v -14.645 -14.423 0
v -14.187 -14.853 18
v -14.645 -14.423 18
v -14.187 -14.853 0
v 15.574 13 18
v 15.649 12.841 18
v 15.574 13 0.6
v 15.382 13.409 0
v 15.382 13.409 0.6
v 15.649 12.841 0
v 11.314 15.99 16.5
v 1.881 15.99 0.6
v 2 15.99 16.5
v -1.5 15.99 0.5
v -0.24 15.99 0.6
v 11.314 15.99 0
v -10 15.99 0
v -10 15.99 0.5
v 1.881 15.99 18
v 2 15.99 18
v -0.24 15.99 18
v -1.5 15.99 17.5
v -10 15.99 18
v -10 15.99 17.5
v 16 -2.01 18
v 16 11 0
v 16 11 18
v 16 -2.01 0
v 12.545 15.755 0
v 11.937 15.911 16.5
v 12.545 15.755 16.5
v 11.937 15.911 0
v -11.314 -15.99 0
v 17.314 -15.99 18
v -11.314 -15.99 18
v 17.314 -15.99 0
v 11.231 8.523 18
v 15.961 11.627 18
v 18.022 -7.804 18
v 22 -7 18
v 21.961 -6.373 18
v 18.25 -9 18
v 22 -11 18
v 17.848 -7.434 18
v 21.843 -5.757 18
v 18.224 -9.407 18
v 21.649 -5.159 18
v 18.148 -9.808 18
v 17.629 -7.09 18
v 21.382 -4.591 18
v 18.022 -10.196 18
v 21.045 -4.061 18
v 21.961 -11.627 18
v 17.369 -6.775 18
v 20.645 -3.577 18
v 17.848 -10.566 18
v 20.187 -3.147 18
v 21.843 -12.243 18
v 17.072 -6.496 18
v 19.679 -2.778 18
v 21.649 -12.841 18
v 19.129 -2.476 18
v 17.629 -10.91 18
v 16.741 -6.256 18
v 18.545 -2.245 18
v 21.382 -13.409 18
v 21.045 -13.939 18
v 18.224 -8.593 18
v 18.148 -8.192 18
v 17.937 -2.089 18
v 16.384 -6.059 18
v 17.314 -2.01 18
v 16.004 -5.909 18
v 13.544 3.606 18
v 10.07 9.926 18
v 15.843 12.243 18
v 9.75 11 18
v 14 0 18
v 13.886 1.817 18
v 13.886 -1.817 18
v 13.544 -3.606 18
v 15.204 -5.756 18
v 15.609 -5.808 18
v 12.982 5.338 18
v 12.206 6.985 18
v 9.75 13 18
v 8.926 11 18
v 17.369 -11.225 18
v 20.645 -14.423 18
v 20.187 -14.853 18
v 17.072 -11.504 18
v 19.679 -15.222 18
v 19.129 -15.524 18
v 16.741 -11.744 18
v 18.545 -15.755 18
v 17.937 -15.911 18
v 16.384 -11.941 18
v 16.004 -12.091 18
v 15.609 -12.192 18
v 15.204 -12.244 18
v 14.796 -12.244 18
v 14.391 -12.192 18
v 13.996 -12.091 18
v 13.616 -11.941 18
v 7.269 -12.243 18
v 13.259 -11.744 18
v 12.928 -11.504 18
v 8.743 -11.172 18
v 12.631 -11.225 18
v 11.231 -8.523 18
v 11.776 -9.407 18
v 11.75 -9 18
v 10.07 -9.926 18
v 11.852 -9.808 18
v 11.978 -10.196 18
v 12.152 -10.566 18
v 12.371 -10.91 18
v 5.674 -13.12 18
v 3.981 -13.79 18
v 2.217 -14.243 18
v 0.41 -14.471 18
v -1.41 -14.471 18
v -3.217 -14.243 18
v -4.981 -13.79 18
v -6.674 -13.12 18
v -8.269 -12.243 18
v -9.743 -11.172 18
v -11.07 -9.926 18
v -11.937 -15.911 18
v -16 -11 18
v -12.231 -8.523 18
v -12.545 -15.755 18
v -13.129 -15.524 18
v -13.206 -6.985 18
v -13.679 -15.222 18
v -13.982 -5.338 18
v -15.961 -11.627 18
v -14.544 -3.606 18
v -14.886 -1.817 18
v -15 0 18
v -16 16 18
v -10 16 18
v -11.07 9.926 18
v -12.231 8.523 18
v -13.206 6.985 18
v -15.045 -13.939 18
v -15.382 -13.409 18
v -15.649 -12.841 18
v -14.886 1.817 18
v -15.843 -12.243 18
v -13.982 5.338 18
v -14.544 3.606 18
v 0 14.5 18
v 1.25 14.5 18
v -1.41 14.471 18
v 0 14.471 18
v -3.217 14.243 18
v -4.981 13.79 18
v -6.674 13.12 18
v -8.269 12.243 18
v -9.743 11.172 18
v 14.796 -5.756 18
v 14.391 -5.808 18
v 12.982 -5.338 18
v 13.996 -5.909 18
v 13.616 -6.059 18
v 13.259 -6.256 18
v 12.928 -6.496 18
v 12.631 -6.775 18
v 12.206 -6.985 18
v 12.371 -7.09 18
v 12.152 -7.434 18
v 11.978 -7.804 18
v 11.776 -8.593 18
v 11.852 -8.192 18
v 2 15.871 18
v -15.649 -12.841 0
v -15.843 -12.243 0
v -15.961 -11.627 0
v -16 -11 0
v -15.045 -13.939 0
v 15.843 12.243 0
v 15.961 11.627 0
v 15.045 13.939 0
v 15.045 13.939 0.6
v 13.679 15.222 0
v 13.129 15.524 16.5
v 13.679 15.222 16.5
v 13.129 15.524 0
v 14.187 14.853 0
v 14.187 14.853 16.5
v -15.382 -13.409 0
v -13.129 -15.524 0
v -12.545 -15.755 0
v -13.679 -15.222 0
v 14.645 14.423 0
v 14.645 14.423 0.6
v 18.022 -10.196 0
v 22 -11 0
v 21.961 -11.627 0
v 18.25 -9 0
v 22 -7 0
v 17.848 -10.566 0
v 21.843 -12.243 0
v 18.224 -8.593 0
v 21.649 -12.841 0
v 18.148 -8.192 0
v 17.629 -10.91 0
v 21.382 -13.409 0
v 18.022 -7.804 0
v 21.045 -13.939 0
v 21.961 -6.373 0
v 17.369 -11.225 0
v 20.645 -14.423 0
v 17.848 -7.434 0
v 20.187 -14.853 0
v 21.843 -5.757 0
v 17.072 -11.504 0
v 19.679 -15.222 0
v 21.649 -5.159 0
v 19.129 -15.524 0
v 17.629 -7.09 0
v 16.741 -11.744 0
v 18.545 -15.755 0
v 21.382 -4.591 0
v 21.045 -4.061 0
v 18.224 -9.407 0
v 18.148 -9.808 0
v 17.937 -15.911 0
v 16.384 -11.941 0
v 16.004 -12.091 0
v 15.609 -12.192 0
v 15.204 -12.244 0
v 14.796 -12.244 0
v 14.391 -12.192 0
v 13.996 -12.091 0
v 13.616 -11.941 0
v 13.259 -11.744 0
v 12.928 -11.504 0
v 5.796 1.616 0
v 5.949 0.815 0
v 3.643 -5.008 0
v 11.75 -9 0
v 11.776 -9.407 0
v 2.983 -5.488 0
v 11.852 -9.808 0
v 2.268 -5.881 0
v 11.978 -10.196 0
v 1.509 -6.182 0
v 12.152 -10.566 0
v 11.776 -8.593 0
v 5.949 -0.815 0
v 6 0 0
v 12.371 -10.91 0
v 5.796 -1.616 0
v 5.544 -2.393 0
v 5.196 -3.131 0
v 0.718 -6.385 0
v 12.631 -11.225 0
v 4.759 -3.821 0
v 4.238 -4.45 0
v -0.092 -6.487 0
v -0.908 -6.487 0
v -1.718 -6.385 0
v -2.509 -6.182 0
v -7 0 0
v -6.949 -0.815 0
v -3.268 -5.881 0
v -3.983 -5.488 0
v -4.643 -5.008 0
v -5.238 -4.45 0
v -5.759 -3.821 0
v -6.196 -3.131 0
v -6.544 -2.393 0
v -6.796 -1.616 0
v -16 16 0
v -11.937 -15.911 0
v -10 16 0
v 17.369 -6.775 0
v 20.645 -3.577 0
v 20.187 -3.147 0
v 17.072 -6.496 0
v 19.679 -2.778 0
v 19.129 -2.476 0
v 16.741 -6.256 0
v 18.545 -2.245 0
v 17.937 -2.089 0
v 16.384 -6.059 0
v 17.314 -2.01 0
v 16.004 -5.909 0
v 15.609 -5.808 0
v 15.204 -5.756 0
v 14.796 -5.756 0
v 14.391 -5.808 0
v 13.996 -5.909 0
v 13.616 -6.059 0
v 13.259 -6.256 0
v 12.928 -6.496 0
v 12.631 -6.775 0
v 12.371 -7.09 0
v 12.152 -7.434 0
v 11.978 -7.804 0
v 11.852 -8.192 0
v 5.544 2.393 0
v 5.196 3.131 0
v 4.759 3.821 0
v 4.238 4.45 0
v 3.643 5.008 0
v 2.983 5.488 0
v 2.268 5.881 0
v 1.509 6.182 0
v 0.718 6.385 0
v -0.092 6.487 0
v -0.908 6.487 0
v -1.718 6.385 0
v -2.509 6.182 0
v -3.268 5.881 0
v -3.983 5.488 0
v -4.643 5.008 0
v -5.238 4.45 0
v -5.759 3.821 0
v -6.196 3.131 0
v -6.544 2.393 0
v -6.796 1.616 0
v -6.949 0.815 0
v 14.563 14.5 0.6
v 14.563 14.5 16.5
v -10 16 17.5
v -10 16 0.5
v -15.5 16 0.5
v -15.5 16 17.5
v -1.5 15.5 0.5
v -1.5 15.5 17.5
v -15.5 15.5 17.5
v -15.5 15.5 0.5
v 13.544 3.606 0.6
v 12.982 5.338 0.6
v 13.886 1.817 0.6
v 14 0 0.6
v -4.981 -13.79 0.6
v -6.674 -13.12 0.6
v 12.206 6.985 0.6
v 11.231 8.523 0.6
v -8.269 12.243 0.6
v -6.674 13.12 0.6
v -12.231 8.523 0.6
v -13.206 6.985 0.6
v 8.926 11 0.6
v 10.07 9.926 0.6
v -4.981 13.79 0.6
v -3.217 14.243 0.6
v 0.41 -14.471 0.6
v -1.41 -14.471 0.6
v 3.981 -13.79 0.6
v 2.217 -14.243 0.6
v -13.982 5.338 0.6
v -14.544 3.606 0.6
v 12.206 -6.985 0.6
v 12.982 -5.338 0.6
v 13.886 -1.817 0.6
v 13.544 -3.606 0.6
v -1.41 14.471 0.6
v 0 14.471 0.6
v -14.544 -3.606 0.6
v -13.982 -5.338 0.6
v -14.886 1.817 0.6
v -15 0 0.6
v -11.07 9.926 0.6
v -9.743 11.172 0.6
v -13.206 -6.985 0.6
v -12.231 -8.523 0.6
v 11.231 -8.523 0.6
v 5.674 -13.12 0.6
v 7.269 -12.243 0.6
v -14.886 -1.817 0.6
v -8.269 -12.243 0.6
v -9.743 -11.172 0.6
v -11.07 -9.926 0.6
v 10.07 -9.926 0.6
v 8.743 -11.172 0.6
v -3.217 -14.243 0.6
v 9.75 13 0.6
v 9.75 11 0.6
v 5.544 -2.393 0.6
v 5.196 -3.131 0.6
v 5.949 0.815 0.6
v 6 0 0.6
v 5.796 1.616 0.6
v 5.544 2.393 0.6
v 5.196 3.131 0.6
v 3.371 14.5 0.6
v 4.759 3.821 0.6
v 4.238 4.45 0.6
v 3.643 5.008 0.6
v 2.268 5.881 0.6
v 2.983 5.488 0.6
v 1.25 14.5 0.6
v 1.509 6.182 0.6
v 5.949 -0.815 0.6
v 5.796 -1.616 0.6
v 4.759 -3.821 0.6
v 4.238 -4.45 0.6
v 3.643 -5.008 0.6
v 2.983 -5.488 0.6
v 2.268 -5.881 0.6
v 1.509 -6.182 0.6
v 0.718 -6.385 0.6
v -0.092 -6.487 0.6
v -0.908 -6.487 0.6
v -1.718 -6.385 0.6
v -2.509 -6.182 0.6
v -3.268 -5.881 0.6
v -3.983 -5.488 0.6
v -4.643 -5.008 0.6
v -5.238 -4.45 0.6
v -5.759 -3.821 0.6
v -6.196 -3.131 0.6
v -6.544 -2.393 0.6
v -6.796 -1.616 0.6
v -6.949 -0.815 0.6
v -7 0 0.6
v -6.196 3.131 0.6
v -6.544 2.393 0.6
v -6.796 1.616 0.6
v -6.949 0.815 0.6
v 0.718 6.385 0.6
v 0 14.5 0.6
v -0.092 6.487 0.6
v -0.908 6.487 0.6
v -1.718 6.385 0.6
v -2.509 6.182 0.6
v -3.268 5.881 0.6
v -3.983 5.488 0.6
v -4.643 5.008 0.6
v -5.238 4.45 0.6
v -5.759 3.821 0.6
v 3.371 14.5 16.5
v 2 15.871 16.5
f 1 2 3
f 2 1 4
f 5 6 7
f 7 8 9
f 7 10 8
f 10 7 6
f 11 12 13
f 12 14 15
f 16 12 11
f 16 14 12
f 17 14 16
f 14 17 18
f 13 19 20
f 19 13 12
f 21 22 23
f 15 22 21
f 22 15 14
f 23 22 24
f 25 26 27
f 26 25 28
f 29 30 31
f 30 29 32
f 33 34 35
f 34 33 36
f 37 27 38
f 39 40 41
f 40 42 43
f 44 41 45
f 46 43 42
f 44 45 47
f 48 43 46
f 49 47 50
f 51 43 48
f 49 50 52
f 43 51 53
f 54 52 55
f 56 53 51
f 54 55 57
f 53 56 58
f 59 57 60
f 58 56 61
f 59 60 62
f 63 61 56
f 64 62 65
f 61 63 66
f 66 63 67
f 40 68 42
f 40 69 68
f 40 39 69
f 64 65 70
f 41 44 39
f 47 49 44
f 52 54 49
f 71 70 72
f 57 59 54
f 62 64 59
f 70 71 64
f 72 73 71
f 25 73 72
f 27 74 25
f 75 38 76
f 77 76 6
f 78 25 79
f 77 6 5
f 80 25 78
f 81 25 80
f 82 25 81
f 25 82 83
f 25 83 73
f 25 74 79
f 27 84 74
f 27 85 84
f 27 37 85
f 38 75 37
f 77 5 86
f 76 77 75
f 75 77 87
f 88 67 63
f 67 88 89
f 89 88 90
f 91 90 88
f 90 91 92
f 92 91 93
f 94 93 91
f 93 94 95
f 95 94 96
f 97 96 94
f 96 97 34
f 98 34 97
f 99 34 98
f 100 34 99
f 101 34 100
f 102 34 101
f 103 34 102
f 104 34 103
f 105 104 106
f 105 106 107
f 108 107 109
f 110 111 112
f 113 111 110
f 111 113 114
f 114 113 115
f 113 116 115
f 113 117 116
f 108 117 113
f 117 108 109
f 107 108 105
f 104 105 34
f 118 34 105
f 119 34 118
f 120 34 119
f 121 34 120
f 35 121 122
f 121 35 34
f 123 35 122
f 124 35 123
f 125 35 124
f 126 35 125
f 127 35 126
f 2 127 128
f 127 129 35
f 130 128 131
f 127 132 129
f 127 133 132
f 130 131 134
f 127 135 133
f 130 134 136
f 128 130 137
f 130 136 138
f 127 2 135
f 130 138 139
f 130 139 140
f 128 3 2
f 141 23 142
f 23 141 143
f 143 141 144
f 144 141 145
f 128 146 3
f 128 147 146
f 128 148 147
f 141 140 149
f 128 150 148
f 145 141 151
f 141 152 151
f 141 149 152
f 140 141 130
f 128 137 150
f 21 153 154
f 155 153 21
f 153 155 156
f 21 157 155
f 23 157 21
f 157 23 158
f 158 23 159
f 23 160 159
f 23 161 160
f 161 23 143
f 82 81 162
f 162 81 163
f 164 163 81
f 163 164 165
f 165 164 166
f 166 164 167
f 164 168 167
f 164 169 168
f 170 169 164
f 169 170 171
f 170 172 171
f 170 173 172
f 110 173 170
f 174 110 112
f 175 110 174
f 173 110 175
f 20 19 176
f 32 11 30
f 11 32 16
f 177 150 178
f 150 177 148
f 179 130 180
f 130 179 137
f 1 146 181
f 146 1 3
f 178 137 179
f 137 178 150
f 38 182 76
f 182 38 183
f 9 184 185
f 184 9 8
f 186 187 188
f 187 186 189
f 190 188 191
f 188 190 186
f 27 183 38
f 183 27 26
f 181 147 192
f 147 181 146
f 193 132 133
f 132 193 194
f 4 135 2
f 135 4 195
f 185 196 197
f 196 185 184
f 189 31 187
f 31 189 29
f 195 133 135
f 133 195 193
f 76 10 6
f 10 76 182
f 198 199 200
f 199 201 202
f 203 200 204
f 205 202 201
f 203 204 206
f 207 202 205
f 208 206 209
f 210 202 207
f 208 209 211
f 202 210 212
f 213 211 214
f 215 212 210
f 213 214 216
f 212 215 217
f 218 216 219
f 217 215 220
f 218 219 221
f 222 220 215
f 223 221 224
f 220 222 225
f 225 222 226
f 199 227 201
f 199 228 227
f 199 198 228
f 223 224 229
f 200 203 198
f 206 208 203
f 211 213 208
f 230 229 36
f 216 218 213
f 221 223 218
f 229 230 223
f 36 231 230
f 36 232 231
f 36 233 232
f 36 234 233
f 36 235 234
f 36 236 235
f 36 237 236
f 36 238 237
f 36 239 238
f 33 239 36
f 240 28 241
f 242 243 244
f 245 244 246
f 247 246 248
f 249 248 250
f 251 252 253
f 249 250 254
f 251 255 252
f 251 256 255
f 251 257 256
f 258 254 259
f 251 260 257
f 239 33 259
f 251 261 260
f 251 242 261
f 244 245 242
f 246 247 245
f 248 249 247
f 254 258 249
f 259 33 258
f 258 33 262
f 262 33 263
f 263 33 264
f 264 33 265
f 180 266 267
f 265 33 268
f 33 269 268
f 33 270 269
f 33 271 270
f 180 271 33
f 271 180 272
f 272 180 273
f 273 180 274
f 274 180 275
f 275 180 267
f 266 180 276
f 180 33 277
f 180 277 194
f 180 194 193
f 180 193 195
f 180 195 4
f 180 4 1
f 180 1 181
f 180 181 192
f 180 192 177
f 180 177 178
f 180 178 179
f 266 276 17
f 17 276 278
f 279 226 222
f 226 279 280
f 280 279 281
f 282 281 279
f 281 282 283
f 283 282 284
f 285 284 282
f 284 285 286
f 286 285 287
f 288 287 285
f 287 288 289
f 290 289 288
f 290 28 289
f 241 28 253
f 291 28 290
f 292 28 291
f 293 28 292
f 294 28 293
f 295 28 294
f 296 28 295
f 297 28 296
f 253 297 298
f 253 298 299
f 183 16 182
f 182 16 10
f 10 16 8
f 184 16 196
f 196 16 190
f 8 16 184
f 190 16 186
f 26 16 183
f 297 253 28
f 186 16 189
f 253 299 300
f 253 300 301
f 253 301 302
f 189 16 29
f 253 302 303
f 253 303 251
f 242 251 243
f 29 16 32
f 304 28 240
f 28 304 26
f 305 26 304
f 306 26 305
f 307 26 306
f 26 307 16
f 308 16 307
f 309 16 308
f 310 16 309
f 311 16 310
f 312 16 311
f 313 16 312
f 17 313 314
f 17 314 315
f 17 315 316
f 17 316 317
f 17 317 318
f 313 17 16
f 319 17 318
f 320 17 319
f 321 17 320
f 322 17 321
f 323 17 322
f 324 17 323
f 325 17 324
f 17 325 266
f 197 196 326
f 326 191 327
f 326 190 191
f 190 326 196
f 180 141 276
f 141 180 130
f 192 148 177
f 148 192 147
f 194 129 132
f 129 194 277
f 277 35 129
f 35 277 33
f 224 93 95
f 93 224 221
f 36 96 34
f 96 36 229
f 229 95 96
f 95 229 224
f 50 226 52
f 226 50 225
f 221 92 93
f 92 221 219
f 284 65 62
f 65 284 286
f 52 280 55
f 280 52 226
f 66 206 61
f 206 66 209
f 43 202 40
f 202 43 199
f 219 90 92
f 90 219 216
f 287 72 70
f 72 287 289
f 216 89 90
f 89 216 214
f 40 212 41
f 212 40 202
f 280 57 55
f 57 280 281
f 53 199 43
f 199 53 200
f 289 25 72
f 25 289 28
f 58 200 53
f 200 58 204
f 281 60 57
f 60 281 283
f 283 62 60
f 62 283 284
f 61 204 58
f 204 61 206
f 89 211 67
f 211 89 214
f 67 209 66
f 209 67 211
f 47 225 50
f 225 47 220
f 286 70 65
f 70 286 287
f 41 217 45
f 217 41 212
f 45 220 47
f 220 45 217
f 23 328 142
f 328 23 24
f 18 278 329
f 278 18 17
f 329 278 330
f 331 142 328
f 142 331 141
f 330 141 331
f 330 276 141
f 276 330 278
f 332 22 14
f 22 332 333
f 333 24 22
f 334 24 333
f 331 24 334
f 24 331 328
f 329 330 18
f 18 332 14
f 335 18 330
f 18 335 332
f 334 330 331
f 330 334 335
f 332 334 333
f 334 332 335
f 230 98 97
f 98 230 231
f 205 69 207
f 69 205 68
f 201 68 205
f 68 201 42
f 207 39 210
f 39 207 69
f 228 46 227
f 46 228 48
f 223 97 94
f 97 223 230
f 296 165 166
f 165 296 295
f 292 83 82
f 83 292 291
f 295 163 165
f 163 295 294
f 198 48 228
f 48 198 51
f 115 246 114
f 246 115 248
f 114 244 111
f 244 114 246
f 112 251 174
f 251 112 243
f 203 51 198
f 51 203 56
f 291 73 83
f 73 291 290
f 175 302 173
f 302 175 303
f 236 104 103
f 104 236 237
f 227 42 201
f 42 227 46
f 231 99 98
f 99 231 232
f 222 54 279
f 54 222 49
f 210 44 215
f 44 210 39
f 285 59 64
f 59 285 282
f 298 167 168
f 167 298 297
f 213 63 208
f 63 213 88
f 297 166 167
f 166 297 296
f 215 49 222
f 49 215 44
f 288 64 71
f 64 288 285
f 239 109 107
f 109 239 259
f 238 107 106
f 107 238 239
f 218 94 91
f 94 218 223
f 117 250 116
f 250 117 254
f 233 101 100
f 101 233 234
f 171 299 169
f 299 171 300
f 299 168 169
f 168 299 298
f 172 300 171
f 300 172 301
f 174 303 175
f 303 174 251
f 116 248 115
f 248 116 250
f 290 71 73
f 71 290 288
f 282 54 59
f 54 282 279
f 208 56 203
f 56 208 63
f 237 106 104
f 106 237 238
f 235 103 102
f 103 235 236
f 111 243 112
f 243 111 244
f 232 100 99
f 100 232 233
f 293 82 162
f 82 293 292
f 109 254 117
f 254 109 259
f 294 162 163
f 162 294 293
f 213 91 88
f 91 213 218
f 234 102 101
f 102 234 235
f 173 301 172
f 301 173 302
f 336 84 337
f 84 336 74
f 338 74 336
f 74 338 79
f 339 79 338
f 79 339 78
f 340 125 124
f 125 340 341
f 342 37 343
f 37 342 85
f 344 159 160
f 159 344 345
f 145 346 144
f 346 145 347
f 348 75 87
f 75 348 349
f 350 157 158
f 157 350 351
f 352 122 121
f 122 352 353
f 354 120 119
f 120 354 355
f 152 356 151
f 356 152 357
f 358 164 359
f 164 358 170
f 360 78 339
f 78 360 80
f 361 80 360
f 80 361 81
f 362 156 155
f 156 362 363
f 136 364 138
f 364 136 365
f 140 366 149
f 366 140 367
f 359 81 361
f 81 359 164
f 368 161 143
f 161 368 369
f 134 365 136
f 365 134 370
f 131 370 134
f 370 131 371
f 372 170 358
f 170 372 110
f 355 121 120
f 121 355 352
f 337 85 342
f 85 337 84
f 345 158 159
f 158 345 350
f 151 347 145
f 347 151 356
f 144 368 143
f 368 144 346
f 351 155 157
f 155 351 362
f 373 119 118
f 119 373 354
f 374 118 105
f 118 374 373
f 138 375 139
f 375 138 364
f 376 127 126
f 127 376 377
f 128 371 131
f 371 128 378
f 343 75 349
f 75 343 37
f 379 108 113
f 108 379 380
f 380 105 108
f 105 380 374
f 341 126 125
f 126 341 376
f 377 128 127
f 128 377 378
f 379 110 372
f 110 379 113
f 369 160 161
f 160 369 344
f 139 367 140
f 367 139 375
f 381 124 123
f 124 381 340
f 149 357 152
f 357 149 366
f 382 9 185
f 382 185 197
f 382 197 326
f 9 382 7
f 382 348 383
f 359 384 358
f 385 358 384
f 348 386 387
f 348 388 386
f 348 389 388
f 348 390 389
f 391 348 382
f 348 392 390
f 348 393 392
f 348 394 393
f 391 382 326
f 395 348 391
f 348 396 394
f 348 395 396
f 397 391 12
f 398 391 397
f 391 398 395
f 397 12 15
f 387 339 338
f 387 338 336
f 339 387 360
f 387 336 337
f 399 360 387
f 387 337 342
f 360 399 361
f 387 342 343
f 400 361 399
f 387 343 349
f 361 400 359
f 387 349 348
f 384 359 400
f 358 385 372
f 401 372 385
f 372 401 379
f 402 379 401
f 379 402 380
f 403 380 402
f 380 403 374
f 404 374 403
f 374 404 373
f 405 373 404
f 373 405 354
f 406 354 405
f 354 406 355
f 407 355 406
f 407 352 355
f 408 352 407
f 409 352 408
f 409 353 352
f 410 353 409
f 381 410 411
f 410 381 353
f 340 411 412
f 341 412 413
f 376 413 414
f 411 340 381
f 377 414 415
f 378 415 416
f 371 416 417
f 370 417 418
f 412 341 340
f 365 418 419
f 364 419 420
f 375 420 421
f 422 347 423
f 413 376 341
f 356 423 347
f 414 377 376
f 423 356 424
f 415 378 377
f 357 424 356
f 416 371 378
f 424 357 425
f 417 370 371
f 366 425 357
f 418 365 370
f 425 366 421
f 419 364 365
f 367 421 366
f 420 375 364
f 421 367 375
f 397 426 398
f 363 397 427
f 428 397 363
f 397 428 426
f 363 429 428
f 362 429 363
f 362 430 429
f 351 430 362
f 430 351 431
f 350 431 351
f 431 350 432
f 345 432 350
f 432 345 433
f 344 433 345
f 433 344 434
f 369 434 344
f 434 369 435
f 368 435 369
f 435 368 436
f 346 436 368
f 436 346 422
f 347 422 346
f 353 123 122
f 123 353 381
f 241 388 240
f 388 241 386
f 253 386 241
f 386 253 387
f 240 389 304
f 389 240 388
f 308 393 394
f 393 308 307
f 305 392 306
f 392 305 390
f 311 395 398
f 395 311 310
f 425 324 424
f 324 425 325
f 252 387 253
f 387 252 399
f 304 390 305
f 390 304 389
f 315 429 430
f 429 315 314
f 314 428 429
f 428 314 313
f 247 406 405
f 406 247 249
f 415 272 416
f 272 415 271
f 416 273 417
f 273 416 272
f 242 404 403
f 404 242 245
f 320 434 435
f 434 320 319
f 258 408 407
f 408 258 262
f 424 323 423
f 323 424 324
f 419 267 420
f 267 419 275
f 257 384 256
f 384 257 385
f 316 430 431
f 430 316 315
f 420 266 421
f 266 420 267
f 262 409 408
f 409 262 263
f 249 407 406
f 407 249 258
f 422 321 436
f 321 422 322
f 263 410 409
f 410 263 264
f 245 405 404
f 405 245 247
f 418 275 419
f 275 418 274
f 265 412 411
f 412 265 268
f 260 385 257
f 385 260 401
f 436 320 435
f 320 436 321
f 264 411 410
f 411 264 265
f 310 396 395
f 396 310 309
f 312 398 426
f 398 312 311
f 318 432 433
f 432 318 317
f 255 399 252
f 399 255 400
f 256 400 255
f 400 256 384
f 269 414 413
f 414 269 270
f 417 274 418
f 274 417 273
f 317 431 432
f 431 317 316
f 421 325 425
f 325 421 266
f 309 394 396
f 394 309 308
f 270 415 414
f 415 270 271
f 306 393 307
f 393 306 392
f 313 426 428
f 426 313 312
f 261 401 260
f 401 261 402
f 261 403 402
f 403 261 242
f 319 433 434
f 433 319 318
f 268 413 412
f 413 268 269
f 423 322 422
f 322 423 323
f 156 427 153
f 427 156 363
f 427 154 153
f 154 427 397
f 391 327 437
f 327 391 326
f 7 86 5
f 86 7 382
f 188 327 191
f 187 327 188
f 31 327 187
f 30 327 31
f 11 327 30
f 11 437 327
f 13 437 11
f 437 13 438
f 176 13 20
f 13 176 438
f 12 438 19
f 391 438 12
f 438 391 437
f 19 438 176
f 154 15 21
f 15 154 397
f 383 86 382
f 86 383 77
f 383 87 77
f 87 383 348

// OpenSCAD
$fn = 50;


difference() {
	union() {
		hull() {
			translate(v = [-11.0000000000, 11.0000000000, 0]) {
				cylinder(h = 18, r = 5);
			}
			translate(v = [11.0000000000, 11.0000000000, 0]) {
				cylinder(h = 18, r = 5);
			}
			translate(v = [-11.0000000000, -11.0000000000, 0]) {
				cylinder(h = 18, r = 5);
			}
			translate(v = [11.0000000000, -11.0000000000, 0]) {
				cylinder(h = 18, r = 5);
			}
		}
		translate(v = [7.5000000000, -9.0000000000, 0]) {
			hull() {
				translate(v = [-9.5000000000, 2.0000000000, 0]) {
					cylinder(h = 18, r = 5);
				}
				translate(v = [9.5000000000, 2.0000000000, 0]) {
					cylinder(h = 18, r = 5);
				}
				translate(v = [-9.5000000000, -2.0000000000, 0]) {
					cylinder(h = 18, r = 5);
				}
				translate(v = [9.5000000000, -2.0000000000, 0]) {
					cylinder(h = 18, r = 5);
				}
			}
		}
		translate(v = [-16.0000000000, 10.0000000000, 0]) {
			cube(size = [6, 6, 18]);
		}
	}
	union() {
		translate(v = [-15.5000000000, 15.5000000000, 0.5000000000]) {
			cube(size = [14, 0.5000000000, 17.0000000000]);
		}
		translate(v = [15.0000000000, -9.0000000000, -50.0000000000]) {
			cylinder(h = 100, r = 3.2500000000);
		}
		translate(v = [-0.5000000000, 0.0000000000, 0.6000000000]) {
			cylinder(h = 20.4000000000, r = 14.5000000000);
		}
		translate(v = [-0.5000000000, 0.0000000000, -9.0000000000]) {
			cylinder(h = 18, r = 6.5000000000);
		}
		translate(v = [0.0000000000, 13.0000000000, 0.6000000000]) {
			cube(size = [16.0000000000, 1.5000000000, 20.4000000000]);
		}
		translate(v = [2.0000000000, 13.0000000000, 16.5000000000]) {
			cube(size = [14.0000000000, 4.5000000000, 1.5000000000]);
		}
		translate(v = [-3.0000000000, 18.7500000000, 0.6000000000]) {
			rotate(a = [0, 0, -45]) {
				cube(size = [10, 1.5000000000, 20.4000000000]);
			}
		}
		translate(v = [2.2500000000, 11.0000000000, 0.6000000000]) {
			cube(size = [7.5000000000, 2, 17.4000000000]);
		}
	}
}
